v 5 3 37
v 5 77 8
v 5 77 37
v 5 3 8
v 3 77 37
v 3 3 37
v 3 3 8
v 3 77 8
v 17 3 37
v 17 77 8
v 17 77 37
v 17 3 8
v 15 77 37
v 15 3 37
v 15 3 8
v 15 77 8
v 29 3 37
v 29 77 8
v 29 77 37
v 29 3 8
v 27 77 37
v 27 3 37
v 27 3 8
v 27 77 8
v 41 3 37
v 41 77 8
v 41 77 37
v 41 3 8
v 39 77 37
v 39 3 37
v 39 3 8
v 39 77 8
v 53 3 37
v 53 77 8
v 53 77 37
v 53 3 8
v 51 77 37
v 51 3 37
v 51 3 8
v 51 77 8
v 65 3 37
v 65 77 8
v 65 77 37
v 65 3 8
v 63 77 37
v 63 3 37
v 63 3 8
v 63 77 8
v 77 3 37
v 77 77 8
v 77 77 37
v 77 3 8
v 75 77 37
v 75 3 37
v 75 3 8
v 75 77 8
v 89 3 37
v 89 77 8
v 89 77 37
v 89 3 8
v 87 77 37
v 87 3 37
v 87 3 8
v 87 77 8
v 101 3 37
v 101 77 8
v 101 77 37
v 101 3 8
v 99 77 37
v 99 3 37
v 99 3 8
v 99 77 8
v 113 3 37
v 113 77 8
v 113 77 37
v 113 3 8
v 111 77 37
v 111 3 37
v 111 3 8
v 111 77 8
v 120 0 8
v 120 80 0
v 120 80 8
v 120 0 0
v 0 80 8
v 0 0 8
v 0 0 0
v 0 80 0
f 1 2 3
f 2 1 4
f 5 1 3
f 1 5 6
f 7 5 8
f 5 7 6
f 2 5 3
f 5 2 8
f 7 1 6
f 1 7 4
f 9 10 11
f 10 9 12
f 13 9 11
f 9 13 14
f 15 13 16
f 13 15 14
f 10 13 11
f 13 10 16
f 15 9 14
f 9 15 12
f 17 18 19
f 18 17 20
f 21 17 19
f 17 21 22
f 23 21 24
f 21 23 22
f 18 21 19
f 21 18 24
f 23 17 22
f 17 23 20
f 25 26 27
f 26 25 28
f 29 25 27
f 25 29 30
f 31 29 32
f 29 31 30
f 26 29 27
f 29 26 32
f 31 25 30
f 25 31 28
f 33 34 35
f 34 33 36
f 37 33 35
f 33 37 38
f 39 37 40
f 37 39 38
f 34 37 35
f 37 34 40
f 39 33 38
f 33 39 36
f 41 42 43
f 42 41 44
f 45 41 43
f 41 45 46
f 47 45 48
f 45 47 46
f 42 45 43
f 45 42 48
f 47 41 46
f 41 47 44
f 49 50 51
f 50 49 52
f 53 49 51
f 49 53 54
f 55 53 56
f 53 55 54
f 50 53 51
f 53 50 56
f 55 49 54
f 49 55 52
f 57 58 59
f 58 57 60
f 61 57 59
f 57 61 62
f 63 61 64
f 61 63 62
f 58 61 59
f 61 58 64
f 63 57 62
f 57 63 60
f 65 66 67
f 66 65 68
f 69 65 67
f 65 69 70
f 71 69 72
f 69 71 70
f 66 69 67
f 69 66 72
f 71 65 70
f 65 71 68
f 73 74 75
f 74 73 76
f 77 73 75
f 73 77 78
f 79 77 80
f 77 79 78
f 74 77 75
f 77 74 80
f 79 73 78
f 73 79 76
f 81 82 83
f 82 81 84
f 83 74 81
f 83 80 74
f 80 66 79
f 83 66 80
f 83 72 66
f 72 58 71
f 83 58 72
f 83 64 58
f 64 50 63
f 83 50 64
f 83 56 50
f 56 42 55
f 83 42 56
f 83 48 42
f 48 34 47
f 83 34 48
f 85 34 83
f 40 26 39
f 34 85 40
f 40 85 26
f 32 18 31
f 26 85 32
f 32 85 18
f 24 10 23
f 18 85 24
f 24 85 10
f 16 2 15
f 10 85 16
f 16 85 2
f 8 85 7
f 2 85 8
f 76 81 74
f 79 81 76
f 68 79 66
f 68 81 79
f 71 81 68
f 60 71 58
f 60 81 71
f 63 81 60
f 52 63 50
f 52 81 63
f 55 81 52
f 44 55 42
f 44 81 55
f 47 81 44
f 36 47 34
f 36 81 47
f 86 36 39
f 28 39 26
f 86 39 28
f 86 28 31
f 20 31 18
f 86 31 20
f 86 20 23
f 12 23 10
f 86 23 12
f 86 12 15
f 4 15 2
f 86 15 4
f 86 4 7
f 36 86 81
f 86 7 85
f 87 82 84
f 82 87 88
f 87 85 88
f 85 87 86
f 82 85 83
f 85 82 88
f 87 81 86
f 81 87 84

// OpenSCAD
$fn = 32;

// ----------------------------------------------------------------------
// Heatsink: uniform fin block
// ----------------------------------------------------------------------

// --- parameters (mm) ---
base_l = 120;             // base length, X
base_w = 80;              // base width, Y
base_t = 8;               // base plate thickness
fin_h = 30;               // fin height above the base
fin_t = 2;                // fin thickness
edge = 3;                 // margin from the base ends
pitch = 12;               // fin pitch

n_fins = floor((base_l - 2 * edge - fin_t) / pitch) + 1;  // fin count
total_h = base_t + fin_h - 1;  // overall height

union() {
  cube([base_l, base_w, base_t]);
  for (i = [0 : n_fins - 1])
    translate([edge + i * pitch, edge, base_t - 1])
      cube([fin_t, base_w - 2 * edge, fin_h]);
}
